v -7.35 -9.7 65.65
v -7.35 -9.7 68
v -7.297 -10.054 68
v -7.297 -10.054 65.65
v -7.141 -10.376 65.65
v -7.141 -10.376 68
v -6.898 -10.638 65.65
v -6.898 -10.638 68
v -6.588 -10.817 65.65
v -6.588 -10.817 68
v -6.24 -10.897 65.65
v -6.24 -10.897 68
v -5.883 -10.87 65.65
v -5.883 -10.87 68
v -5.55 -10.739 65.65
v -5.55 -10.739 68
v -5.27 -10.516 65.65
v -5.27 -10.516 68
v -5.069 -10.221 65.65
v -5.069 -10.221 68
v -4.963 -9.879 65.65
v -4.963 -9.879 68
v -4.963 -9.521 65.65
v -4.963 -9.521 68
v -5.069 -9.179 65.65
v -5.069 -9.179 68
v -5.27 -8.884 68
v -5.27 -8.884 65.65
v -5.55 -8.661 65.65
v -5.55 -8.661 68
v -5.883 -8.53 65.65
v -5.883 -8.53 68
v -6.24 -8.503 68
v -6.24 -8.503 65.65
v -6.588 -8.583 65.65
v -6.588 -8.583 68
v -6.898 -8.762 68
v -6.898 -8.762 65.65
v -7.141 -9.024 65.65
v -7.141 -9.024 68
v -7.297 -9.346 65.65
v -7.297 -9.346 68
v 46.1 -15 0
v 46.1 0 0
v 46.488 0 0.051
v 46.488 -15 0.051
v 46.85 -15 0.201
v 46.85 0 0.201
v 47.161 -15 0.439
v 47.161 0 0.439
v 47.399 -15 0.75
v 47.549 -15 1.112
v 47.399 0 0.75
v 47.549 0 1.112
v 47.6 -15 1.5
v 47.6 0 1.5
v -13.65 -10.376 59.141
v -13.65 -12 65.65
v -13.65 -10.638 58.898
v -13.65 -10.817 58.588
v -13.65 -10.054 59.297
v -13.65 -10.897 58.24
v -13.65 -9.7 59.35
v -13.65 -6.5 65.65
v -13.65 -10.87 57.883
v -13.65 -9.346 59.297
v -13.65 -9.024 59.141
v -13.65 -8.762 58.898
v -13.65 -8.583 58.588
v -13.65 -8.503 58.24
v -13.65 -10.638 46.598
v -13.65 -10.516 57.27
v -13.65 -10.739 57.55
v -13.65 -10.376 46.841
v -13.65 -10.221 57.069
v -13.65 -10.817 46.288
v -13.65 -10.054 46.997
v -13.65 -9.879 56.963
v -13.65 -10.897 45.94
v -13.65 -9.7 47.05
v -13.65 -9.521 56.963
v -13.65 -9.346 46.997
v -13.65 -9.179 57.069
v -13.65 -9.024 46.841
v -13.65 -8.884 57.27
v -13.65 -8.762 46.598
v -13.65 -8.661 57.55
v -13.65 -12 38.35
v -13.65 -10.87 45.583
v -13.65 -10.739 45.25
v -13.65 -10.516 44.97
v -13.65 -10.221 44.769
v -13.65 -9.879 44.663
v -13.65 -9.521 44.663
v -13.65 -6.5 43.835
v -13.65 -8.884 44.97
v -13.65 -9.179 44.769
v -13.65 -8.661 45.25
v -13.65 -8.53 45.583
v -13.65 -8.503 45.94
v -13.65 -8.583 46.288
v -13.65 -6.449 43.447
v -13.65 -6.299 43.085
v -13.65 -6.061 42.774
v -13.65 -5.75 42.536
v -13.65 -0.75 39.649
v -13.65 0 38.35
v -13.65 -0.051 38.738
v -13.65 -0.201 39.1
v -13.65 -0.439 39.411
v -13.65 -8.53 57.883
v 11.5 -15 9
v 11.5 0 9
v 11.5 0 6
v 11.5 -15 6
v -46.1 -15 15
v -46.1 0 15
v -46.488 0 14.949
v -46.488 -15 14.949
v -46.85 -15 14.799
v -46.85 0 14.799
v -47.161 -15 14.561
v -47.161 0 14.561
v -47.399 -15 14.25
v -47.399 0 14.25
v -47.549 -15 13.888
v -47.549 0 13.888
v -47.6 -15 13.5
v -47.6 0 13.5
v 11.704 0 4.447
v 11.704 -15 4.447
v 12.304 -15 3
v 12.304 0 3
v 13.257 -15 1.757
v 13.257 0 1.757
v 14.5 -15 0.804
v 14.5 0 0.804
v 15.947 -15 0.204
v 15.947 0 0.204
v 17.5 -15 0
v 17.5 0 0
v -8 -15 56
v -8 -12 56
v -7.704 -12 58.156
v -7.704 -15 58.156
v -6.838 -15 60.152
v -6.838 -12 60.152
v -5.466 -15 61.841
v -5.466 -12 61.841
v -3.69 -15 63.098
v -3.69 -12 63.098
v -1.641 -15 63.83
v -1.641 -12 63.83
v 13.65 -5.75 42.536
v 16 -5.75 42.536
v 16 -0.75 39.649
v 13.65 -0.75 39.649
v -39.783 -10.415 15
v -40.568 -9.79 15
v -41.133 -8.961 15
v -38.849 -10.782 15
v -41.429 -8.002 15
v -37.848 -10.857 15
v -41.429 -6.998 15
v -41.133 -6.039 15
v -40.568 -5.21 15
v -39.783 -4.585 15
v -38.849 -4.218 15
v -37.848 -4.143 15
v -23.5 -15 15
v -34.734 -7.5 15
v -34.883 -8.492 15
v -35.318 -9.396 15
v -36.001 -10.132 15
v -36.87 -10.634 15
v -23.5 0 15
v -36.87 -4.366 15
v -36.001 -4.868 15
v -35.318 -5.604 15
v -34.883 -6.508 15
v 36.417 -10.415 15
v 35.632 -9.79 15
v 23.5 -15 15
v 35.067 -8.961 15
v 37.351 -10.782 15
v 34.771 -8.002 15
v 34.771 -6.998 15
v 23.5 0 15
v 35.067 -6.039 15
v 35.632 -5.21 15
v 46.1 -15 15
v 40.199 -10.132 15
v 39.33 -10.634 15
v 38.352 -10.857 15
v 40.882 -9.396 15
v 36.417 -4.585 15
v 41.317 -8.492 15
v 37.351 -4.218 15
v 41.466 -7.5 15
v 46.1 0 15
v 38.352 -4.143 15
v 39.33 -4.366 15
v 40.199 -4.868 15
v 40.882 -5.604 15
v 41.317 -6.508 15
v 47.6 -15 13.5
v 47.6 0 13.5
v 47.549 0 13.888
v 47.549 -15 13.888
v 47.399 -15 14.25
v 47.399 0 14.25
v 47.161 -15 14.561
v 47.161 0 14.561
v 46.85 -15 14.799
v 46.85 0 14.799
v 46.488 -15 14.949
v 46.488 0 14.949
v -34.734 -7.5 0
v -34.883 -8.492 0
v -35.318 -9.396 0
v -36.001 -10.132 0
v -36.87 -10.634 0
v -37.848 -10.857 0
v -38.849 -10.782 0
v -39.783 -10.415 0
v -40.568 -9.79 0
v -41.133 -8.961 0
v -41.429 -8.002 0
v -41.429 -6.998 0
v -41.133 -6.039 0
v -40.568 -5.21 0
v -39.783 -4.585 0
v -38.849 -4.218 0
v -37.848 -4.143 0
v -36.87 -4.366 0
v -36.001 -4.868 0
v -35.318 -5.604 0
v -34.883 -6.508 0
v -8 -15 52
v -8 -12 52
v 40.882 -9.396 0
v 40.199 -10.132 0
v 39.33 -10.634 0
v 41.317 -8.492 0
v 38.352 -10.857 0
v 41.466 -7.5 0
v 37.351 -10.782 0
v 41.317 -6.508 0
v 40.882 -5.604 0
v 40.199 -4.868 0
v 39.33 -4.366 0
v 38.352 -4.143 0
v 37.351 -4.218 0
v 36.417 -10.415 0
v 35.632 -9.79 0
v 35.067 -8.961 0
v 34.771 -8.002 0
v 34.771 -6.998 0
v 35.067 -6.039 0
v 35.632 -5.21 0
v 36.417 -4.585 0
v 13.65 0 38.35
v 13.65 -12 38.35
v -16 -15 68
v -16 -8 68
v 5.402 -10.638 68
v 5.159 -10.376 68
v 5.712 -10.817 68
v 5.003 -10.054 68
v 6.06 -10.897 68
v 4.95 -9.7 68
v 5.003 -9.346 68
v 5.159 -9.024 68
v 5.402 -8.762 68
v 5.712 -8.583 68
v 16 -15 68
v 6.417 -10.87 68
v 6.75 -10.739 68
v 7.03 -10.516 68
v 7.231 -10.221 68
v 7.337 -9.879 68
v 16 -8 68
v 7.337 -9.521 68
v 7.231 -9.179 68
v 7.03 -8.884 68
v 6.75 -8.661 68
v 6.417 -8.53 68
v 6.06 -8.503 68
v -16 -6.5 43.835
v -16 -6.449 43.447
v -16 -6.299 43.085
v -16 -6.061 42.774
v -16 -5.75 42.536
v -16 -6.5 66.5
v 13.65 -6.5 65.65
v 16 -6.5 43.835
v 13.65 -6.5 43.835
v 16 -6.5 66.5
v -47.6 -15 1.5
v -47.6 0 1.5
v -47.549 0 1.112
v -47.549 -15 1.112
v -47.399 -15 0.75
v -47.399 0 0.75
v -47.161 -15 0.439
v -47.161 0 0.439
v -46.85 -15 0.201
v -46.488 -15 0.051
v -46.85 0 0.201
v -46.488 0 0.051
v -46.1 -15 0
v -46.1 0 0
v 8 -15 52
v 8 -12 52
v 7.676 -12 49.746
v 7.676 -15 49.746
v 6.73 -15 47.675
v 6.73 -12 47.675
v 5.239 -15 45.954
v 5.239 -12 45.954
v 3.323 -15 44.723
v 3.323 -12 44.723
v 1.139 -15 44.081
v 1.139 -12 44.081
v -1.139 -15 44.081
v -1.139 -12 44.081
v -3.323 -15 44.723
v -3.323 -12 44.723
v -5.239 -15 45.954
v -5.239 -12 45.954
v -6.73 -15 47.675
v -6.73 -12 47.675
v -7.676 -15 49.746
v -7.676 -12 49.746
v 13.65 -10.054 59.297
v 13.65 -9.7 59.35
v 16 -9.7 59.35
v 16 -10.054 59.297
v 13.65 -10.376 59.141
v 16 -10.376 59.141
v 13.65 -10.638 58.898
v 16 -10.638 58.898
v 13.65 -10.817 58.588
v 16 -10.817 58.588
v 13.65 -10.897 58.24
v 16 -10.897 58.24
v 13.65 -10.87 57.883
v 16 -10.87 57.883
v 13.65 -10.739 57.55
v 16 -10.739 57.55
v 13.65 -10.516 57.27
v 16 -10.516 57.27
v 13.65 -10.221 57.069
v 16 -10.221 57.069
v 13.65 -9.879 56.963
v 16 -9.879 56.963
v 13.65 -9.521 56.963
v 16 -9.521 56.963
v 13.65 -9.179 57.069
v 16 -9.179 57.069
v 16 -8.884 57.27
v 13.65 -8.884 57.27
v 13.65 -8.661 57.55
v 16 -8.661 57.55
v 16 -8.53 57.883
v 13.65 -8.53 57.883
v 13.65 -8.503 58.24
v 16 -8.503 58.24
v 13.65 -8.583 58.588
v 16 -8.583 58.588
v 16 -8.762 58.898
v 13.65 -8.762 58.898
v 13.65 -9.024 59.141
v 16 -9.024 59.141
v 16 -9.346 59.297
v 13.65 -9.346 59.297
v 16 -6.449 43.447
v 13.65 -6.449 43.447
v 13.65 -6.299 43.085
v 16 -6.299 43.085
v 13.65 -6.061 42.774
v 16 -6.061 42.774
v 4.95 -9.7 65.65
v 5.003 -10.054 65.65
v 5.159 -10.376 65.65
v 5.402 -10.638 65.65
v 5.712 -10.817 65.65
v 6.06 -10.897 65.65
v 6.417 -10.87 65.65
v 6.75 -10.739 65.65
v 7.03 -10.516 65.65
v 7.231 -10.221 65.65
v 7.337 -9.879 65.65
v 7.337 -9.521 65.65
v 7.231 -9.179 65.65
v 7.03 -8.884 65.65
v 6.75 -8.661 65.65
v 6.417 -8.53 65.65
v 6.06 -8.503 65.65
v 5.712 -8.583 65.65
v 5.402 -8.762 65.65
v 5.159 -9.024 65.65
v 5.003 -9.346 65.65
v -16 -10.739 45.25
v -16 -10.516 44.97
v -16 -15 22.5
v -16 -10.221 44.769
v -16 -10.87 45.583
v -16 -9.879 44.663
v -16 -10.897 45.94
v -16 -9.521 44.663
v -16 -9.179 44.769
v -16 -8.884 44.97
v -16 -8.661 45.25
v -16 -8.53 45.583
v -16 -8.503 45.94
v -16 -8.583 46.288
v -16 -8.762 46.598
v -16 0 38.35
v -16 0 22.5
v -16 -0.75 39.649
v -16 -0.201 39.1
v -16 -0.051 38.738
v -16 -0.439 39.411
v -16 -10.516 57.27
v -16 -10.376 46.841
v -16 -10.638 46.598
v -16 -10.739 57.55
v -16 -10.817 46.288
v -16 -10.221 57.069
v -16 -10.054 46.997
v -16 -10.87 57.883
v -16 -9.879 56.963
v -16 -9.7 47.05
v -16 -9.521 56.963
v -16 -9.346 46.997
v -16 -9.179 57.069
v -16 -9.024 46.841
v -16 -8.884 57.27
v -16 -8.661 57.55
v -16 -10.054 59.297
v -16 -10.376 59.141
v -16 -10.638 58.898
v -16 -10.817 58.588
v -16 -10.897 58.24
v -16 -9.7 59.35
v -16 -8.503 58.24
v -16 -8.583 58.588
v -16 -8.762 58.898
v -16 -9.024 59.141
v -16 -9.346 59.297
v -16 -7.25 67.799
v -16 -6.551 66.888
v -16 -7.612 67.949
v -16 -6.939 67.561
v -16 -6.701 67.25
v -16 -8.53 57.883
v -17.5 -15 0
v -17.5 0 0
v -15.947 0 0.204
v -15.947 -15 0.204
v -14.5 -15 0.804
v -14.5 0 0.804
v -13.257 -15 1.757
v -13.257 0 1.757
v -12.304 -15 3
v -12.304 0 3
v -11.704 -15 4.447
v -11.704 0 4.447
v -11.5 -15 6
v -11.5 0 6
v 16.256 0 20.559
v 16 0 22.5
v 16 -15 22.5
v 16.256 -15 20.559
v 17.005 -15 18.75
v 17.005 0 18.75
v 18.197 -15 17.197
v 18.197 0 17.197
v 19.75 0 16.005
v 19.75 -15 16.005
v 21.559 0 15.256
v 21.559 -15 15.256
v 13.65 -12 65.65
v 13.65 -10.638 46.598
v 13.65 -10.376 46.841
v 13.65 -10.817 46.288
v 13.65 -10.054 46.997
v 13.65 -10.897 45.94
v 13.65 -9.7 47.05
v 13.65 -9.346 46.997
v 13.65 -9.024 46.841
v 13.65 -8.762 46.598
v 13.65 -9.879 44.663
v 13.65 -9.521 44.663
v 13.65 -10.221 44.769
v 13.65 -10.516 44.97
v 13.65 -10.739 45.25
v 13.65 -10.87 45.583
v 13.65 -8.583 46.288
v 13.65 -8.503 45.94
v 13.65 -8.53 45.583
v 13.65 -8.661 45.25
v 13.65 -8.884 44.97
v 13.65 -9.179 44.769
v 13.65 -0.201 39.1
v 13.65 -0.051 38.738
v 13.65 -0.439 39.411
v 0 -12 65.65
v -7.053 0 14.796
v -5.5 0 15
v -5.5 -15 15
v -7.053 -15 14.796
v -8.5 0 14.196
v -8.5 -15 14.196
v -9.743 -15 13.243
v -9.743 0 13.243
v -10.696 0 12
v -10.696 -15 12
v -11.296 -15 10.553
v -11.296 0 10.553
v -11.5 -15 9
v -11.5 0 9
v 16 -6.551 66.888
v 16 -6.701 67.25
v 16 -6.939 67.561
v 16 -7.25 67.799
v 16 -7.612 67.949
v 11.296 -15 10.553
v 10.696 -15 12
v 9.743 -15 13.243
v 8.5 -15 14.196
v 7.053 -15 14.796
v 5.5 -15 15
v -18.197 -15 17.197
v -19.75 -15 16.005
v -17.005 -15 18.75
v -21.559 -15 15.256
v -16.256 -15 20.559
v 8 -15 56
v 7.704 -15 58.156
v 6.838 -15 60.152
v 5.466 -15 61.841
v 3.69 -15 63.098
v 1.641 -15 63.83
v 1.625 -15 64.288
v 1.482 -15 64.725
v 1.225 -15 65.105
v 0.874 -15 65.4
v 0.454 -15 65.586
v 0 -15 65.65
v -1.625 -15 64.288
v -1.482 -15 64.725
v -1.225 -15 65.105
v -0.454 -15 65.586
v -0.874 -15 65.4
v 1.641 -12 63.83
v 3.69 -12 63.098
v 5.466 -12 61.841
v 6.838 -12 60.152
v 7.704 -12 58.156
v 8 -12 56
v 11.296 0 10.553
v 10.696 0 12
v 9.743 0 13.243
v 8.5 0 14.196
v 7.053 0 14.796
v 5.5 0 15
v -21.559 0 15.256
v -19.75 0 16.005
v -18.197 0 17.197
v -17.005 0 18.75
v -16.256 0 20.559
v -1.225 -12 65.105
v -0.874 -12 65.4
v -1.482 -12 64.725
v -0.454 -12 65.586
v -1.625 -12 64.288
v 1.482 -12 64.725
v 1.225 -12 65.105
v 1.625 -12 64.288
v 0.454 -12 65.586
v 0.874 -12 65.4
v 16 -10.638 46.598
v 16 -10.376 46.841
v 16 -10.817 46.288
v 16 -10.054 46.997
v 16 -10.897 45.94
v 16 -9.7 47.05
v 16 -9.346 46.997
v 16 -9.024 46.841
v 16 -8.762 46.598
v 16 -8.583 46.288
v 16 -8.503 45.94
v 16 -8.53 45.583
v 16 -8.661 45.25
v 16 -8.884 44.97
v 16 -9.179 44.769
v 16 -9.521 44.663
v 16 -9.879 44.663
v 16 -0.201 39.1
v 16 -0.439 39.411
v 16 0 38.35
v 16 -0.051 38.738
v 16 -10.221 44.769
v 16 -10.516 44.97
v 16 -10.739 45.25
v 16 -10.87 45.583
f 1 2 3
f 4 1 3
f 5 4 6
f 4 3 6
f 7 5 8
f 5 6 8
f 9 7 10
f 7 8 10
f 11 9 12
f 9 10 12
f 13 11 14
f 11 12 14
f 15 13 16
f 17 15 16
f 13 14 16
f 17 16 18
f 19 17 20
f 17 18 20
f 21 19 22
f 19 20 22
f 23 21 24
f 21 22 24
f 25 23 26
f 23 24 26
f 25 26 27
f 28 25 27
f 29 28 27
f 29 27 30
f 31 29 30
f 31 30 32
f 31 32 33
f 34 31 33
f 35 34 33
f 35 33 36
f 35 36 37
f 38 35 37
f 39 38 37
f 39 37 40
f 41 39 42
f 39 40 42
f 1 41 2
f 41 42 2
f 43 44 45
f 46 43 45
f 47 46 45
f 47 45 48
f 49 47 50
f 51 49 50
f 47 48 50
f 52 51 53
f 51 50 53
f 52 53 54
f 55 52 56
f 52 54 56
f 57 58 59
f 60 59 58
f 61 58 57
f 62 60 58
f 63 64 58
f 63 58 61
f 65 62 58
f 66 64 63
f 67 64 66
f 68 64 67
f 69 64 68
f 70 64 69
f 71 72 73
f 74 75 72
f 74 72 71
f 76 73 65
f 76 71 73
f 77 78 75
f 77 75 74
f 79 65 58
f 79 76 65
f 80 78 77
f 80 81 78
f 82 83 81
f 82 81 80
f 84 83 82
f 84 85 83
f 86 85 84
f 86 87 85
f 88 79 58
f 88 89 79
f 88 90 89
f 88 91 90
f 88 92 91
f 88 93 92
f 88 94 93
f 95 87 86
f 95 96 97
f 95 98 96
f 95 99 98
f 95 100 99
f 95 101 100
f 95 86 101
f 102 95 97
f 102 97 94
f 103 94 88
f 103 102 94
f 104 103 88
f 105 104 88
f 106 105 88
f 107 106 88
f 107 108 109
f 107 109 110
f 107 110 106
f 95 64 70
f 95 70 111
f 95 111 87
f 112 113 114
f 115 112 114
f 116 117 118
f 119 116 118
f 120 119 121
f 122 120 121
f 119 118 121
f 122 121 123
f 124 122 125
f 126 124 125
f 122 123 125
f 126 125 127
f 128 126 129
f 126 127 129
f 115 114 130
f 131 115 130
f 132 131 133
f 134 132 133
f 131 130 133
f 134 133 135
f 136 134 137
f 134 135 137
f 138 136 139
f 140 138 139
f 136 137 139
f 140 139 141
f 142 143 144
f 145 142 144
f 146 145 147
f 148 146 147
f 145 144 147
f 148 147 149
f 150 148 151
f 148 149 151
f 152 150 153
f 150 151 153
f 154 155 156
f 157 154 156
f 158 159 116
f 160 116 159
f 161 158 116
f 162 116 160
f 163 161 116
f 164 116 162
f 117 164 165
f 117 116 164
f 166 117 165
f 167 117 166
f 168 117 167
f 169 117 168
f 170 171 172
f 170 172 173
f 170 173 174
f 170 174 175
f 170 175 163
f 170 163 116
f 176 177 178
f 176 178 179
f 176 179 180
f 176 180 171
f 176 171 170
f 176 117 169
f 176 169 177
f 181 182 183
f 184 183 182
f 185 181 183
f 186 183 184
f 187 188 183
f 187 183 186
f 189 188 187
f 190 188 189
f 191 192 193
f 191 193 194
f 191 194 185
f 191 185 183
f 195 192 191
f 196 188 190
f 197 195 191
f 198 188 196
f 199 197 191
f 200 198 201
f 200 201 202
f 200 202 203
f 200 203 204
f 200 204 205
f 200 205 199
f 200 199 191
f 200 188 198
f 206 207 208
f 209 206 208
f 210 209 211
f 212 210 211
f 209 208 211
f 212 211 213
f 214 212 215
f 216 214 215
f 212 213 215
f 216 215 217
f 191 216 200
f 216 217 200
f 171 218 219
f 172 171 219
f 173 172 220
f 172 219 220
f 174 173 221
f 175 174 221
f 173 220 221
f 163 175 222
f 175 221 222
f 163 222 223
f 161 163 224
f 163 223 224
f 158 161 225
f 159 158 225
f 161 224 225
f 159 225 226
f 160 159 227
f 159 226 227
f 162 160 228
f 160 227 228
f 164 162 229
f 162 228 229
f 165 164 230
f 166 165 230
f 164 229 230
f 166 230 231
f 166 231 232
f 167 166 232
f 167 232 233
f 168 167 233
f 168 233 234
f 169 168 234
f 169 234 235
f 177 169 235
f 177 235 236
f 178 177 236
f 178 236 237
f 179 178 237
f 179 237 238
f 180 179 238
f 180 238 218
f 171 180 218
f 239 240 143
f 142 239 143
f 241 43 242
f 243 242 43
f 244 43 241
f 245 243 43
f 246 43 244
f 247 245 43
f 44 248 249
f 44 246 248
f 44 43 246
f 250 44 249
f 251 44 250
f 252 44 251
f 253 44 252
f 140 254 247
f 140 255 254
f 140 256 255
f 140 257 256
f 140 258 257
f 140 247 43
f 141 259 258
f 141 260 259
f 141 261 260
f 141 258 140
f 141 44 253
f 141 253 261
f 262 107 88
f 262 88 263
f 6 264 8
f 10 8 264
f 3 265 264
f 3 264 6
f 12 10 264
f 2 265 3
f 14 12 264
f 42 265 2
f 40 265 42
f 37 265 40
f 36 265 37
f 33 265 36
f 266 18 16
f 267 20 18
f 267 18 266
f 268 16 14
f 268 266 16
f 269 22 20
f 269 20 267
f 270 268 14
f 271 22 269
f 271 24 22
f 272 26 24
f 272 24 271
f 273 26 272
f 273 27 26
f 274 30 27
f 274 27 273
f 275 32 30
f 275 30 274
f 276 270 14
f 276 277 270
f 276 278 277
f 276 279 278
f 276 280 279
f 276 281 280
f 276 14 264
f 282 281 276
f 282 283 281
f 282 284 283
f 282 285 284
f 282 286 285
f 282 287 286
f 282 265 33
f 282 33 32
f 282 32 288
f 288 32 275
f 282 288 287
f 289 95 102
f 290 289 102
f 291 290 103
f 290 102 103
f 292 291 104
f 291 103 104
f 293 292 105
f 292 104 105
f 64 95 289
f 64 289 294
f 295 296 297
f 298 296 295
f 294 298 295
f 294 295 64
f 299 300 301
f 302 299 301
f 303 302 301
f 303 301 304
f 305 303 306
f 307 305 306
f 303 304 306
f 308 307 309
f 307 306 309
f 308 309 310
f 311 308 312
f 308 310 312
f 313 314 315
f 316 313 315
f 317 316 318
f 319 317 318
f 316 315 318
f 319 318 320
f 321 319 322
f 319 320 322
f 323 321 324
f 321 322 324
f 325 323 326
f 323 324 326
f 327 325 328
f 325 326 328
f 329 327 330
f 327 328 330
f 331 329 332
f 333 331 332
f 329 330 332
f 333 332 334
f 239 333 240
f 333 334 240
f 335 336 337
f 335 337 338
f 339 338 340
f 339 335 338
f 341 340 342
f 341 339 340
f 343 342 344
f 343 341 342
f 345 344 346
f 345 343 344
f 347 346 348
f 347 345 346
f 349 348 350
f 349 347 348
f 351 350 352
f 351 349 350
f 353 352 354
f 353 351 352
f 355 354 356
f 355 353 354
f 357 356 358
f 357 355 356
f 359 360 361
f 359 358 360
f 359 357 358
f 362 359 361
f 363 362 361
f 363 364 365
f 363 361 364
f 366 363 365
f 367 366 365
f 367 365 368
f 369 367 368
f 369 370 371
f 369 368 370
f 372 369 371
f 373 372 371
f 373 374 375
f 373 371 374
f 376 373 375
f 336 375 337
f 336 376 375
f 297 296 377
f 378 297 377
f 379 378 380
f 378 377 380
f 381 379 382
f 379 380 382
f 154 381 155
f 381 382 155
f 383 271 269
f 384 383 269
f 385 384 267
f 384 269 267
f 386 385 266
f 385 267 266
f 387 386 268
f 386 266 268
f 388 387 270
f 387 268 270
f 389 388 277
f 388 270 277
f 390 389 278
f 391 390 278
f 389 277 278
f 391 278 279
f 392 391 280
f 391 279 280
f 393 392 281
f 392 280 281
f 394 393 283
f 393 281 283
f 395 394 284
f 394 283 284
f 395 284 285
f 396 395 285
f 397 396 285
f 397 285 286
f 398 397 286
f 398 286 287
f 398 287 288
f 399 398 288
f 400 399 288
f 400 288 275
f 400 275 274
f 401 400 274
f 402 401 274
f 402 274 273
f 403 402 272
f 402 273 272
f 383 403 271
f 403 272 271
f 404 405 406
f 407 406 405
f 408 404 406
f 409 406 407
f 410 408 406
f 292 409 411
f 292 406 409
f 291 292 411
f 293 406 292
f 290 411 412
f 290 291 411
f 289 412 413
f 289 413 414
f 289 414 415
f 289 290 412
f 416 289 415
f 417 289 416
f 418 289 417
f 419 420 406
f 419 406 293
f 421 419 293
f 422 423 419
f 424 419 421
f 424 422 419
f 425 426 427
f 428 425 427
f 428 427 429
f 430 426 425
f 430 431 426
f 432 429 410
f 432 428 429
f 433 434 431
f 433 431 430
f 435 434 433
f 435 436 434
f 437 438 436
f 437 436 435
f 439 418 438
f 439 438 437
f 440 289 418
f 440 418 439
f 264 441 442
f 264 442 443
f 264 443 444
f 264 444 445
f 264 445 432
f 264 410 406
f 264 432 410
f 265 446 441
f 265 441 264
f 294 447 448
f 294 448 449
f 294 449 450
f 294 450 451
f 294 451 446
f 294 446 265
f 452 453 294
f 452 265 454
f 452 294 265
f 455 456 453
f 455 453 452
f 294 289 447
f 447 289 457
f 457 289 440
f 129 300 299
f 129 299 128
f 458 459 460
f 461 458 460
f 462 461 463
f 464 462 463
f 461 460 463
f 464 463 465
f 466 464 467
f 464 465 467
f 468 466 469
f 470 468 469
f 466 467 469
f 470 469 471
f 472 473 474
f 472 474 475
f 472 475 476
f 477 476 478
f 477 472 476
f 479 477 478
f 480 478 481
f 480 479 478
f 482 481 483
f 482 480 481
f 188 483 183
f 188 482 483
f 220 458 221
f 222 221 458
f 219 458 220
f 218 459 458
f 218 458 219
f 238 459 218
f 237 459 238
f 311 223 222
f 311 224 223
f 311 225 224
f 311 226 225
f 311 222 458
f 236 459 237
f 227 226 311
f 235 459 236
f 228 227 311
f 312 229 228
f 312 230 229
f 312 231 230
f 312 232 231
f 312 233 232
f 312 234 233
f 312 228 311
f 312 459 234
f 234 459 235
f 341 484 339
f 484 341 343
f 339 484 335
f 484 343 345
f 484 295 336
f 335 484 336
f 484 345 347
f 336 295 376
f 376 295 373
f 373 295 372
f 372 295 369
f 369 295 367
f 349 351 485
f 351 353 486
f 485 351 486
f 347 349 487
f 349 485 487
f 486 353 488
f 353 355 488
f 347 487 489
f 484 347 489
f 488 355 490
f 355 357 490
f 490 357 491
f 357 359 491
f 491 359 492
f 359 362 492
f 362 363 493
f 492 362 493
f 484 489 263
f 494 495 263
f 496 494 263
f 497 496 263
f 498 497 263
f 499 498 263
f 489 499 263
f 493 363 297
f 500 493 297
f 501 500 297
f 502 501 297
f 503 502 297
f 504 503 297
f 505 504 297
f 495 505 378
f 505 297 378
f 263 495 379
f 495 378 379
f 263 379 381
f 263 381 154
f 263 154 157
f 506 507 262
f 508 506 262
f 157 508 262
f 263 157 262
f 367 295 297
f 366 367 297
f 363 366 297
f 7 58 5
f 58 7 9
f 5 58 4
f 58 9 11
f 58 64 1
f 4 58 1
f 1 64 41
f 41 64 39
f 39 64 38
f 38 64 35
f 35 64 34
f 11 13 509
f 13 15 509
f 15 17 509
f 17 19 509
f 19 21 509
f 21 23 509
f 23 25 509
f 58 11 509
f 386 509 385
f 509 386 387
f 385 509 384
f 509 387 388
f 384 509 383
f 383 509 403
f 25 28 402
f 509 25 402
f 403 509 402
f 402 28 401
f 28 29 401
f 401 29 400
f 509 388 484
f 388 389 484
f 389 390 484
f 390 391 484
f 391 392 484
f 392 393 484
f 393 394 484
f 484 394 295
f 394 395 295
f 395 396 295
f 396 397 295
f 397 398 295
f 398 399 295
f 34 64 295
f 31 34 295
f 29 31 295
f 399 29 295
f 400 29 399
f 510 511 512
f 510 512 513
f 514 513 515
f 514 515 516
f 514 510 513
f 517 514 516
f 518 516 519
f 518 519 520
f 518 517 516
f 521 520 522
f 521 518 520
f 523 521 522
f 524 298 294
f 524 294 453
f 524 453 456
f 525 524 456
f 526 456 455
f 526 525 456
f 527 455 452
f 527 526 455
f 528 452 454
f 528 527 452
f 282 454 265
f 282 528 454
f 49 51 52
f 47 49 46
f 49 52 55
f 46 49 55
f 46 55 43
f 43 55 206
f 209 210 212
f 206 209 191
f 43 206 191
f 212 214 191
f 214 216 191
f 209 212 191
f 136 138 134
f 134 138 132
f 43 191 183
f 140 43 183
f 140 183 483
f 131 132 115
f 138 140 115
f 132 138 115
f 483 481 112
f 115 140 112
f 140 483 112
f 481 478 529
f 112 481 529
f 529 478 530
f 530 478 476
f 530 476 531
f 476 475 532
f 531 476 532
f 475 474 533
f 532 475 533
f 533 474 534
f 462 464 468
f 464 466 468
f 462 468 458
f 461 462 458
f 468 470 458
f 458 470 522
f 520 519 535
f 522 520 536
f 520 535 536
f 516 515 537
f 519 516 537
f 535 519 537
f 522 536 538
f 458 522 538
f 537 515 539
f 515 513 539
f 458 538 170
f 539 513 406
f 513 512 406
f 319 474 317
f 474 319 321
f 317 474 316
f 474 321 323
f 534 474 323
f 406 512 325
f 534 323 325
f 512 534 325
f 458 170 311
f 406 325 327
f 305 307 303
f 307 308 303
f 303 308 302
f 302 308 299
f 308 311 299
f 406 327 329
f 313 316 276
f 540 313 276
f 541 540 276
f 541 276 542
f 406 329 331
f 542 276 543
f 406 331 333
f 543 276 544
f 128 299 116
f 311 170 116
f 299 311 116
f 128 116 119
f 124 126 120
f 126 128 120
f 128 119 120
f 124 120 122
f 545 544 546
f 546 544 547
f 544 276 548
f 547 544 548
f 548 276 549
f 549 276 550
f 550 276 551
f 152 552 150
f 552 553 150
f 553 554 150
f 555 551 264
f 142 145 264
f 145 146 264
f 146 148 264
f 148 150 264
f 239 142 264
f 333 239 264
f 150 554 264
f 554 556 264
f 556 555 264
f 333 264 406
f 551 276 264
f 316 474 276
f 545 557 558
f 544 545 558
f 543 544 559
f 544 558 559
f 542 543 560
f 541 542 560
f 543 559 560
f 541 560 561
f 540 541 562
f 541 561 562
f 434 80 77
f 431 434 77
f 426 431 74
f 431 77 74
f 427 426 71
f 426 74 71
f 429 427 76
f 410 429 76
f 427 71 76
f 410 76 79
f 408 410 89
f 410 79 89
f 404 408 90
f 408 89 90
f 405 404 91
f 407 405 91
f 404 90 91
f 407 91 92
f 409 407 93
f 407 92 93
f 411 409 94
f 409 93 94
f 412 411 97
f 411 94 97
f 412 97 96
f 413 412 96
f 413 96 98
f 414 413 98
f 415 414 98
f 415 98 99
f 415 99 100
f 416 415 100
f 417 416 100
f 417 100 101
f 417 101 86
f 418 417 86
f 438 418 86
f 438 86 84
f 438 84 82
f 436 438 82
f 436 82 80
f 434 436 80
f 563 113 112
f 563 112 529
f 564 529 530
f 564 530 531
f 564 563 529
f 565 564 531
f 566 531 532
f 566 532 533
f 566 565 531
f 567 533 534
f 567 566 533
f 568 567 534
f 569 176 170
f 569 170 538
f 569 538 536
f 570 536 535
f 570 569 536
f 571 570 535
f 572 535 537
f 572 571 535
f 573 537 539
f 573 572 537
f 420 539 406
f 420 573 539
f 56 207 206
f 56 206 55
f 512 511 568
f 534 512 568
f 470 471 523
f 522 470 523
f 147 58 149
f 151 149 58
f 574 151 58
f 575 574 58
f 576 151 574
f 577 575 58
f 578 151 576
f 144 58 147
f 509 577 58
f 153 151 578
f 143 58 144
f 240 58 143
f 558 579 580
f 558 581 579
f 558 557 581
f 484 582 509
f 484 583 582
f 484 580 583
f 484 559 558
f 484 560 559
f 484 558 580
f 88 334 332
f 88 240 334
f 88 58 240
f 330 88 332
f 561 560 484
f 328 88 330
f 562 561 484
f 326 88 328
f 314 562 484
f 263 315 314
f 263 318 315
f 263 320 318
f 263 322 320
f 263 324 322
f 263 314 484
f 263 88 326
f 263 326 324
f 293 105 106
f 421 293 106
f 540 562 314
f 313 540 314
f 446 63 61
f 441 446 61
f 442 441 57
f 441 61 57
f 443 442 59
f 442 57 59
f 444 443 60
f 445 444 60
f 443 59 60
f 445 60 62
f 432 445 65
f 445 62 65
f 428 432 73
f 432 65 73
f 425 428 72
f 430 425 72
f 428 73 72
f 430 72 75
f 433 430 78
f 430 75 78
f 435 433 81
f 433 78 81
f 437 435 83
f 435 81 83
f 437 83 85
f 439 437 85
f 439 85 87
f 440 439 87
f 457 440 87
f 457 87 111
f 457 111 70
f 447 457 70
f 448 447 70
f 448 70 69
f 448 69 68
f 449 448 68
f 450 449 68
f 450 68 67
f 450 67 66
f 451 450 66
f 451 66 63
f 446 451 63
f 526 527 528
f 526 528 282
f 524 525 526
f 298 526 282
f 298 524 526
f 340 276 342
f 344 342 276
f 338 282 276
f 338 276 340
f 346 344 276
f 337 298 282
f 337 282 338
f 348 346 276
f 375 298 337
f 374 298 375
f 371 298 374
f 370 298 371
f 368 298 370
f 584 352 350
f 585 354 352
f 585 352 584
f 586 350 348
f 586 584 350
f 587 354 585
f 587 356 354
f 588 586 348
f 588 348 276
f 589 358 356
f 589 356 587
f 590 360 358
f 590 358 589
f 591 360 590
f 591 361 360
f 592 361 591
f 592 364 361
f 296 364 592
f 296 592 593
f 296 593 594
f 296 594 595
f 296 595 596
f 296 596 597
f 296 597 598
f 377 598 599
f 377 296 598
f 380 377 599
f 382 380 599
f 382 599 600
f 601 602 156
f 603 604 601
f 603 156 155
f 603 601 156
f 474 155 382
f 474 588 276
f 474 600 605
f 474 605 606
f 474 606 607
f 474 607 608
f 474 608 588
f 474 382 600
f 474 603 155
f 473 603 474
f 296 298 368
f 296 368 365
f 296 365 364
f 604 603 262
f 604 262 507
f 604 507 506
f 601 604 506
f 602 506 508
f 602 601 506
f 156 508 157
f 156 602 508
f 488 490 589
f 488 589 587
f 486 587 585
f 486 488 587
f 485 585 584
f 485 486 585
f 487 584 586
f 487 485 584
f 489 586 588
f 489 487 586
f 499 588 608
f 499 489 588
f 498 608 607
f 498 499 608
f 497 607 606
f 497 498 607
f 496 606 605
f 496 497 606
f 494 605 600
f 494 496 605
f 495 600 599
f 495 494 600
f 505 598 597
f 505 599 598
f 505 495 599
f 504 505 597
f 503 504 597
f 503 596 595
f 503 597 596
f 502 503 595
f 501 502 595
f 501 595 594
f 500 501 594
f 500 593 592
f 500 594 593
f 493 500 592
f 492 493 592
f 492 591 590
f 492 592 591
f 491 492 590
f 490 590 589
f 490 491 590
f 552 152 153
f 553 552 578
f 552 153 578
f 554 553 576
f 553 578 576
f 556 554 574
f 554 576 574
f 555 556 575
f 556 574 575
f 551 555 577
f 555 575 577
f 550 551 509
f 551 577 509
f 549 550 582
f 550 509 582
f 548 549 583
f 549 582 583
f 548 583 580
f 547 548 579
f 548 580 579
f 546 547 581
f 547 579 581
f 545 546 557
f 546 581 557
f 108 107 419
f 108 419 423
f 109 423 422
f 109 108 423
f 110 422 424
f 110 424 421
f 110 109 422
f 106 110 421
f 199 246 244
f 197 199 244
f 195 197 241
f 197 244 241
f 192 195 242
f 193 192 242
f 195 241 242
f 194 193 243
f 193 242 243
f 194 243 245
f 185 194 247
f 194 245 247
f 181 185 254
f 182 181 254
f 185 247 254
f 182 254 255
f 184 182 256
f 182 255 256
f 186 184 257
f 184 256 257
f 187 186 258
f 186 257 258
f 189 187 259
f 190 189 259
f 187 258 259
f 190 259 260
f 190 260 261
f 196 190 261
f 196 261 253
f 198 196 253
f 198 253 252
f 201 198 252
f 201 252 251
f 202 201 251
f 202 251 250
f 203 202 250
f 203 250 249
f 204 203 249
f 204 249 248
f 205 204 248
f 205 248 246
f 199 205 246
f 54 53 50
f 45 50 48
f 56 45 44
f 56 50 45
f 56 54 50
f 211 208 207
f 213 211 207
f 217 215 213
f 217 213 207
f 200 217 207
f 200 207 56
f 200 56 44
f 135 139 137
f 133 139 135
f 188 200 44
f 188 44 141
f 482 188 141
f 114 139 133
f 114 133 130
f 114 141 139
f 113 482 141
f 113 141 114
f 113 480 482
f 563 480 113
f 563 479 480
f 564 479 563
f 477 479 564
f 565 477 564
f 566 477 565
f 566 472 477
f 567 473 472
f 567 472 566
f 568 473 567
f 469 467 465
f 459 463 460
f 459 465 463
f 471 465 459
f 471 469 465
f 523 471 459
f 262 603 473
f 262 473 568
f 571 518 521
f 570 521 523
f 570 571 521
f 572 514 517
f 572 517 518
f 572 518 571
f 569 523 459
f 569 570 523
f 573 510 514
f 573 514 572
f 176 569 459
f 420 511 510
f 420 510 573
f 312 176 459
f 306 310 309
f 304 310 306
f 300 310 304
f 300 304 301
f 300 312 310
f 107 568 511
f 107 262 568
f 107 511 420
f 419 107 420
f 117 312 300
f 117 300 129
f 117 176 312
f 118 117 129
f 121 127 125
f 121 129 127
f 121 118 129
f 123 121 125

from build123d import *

# Parameters (mm, degrees)
PAD008_DEPTH         = 15
SKETCH021_W          = 27.3
SKETCH021_H          = 27.3
POCKET006_DEPTH      = 12
POCKET007_DEPTH      = 5
SKETCH023_R          = 3.3665
POCKET008_DEPTH      = 68.001
SKETCH024_R          = 1.2
POCKET009_DEPTH      = 2.35
SKETCH026_R          = 1.2
POCKET010_DEPTH      = 33.951
POCKET010_DEPTH_BACK = 61.251
POCKET011_DEPTH      = 63.601


with BuildPart() as part:
    # Sketch020 → Pad008 (new body)
    with BuildSketch(Plane.XZ):
        with BuildLine():
            Line((-47.6, 1.5), (-47.6, 13.5))
            ThreePointArc((-46.1, 15), (-47.1606601718, 14.5606601718), (-47.6, 13.5))
            Line((-46.1, 15), (-23.5, 15))
            ThreePointArc((-23.5, 15), (-18.1966991411, 17.1966991411), (-16, 22.5))
            Line((-16, 22.5), (-16, 68))
            Line((-16, 68), (16, 68))
            Line((16, 68), (16, 22.5))
            ThreePointArc((16, 22.5), (18.1966991411, 17.1966991411), (23.5, 15))
            Line((23.5, 15), (46.1, 15))
            ThreePointArc((47.6, 13.5), (47.1606601718, 14.5606601718), (46.1, 15))
            Line((47.6, 13.5), (47.6, 1.5))
            ThreePointArc((46.1, 0), (47.1606601718, 0.4393398282), (47.6, 1.5))
            Line((46.1, 0), (17.5, 0))
            ThreePointArc((11.5, 6), (13.2573593129, 1.7573593129), (17.5, 0))
            Line((11.5, 9), (11.5, 6))
            ThreePointArc((11.5, 9), (9.7426406871, 13.2426406871), (5.5, 15))
            Line((-5.5, 15), (5.5, 15))
            ThreePointArc((-5.5, 15), (-9.7426406871, 13.2426406871), (-11.5, 9))
            Line((-11.5, 6), (-11.5, 9))
            ThreePointArc((-17.5, 0), (-13.2573593129, 1.7573593129), (-11.5, 6))
            Line((-17.5, 0), (-46.1, 0))
            ThreePointArc((-47.6, 1.5), (-47.1606601718, 0.4393398282), (-46.1, 0))
        make_face()
    extrude(amount=PAD008_DEPTH)

    # Sketch021 (on Face23 of Pad008) → Pocket006 (cut)
    with BuildSketch(Plane(origin=(0, 0, 0), x_dir=(1, 0, 0), z_dir=(0, 1, 0))):
        with Locations((0, -52)):
            Rectangle(SKETCH021_W, SKETCH021_H)
    extrude(amount=-POCKET006_DEPTH, mode=Mode.SUBTRACT)

    # Sketch022 (on Face29 of Pocket006) → Pocket007 (cut)
    with BuildSketch(Plane(origin=(0, -12, 0), x_dir=(1, 0, 0), z_dir=(0, 1, 0))):
        with BuildLine():
            ThreePointArc((-8, -56.0000000001), (-6.2100572838, -61.0433310949), (-1.6412028669, -63.8298437501))
            ThreePointArc((-1.6412028669, -63.8298437501), (0, -65.65), (1.6412028669, -63.8298437501))
            ThreePointArc((1.6412028669, -63.8298437501), (6.2100482063, -61.0433422724), (7.9999999999, -56.0000287985))
            Line((7.9999999999, -56.0000287985), (7.9999999999, -52.0000000001))
            ThreePointArc((8, -52.0000000001), (0, -44.0000000001), (-8, -52.0000000001))
            Line((-8, -52.0000000001), (-8, -56.0000000001))
        make_face()
    extrude(amount=-POCKET007_DEPTH, mode=Mode.SUBTRACT)

    # Sketch023 (on Face22 of Pocket007) → Pocket008 (cut, through all)
    with BuildSketch(Plane(origin=(0, 0, 0), x_dir=(1, 0, 0), z_dir=(0, 0, -1))):
        with Locations((38.1, 7.5)):
            Circle(SKETCH023_R)
        with Locations((-38.1, 7.5)):
            Circle(SKETCH023_R)
    extrude(amount=-POCKET008_DEPTH, mode=Mode.SUBTRACT)

    # Sketch024 (on Face13 of Pocket008) → Pocket009 (cut)
    with BuildSketch(Plane(origin=(0, 0, 68), x_dir=(-1, 0, 0), z_dir=(0, 0, 1))):
        with Locations((-6.15, 9.7)):
            Circle(SKETCH024_R)
        with Locations((6.15, 9.7)):
            Circle(SKETCH024_R)
    extrude(amount=-POCKET009_DEPTH, mode=Mode.SUBTRACT)

    # Sketch026 (on Face27 of Pocket009) → Pocket010 (cut, two sides)
    with BuildSketch(Plane(origin=(-13.65, 0, 0), x_dir=(0, 0, 1), z_dir=(1, 0, 0))) as pocket010_sk:
        with Locations((45.85, 9.7)):
            Circle(SKETCH026_R)
        with Locations((58.15, 9.7)):
            Circle(SKETCH026_R)
    extrude(amount=-POCKET010_DEPTH, mode=Mode.SUBTRACT)
    extrude(pocket010_sk.sketch, amount=POCKET010_DEPTH_BACK, mode=Mode.SUBTRACT)

    # Sketch027 (on Face15 of Pocket010) → Pocket011 (cut, through all)
    with BuildSketch(Plane(origin=(16, 0, 0), x_dir=(0, 0, 1), z_dir=(1, 0, 0))):
        with BuildLine():
            ThreePointArc((66.5, 6.5), (67.5606601718, 6.9393398282), (68, 8))
            Line((68, 8), (68, 0))
            Line((68, 0), (38.35, 0))
            ThreePointArc((38.35, 0), (39.1, 0.2009618943), (39.6490381057, 0.75))
            Line((42.5357894517, 5.75), (39.6490381057, 0.75))
            ThreePointArc((43.8348275573, 6.5), (43.0848275573, 6.2990381057), (42.5357894517, 5.75))
            Line((43.8348275573, 6.5), (66.5, 6.5))
        make_face()
    extrude(amount=-POCKET011_DEPTH, mode=Mode.SUBTRACT)


solid = part.part
